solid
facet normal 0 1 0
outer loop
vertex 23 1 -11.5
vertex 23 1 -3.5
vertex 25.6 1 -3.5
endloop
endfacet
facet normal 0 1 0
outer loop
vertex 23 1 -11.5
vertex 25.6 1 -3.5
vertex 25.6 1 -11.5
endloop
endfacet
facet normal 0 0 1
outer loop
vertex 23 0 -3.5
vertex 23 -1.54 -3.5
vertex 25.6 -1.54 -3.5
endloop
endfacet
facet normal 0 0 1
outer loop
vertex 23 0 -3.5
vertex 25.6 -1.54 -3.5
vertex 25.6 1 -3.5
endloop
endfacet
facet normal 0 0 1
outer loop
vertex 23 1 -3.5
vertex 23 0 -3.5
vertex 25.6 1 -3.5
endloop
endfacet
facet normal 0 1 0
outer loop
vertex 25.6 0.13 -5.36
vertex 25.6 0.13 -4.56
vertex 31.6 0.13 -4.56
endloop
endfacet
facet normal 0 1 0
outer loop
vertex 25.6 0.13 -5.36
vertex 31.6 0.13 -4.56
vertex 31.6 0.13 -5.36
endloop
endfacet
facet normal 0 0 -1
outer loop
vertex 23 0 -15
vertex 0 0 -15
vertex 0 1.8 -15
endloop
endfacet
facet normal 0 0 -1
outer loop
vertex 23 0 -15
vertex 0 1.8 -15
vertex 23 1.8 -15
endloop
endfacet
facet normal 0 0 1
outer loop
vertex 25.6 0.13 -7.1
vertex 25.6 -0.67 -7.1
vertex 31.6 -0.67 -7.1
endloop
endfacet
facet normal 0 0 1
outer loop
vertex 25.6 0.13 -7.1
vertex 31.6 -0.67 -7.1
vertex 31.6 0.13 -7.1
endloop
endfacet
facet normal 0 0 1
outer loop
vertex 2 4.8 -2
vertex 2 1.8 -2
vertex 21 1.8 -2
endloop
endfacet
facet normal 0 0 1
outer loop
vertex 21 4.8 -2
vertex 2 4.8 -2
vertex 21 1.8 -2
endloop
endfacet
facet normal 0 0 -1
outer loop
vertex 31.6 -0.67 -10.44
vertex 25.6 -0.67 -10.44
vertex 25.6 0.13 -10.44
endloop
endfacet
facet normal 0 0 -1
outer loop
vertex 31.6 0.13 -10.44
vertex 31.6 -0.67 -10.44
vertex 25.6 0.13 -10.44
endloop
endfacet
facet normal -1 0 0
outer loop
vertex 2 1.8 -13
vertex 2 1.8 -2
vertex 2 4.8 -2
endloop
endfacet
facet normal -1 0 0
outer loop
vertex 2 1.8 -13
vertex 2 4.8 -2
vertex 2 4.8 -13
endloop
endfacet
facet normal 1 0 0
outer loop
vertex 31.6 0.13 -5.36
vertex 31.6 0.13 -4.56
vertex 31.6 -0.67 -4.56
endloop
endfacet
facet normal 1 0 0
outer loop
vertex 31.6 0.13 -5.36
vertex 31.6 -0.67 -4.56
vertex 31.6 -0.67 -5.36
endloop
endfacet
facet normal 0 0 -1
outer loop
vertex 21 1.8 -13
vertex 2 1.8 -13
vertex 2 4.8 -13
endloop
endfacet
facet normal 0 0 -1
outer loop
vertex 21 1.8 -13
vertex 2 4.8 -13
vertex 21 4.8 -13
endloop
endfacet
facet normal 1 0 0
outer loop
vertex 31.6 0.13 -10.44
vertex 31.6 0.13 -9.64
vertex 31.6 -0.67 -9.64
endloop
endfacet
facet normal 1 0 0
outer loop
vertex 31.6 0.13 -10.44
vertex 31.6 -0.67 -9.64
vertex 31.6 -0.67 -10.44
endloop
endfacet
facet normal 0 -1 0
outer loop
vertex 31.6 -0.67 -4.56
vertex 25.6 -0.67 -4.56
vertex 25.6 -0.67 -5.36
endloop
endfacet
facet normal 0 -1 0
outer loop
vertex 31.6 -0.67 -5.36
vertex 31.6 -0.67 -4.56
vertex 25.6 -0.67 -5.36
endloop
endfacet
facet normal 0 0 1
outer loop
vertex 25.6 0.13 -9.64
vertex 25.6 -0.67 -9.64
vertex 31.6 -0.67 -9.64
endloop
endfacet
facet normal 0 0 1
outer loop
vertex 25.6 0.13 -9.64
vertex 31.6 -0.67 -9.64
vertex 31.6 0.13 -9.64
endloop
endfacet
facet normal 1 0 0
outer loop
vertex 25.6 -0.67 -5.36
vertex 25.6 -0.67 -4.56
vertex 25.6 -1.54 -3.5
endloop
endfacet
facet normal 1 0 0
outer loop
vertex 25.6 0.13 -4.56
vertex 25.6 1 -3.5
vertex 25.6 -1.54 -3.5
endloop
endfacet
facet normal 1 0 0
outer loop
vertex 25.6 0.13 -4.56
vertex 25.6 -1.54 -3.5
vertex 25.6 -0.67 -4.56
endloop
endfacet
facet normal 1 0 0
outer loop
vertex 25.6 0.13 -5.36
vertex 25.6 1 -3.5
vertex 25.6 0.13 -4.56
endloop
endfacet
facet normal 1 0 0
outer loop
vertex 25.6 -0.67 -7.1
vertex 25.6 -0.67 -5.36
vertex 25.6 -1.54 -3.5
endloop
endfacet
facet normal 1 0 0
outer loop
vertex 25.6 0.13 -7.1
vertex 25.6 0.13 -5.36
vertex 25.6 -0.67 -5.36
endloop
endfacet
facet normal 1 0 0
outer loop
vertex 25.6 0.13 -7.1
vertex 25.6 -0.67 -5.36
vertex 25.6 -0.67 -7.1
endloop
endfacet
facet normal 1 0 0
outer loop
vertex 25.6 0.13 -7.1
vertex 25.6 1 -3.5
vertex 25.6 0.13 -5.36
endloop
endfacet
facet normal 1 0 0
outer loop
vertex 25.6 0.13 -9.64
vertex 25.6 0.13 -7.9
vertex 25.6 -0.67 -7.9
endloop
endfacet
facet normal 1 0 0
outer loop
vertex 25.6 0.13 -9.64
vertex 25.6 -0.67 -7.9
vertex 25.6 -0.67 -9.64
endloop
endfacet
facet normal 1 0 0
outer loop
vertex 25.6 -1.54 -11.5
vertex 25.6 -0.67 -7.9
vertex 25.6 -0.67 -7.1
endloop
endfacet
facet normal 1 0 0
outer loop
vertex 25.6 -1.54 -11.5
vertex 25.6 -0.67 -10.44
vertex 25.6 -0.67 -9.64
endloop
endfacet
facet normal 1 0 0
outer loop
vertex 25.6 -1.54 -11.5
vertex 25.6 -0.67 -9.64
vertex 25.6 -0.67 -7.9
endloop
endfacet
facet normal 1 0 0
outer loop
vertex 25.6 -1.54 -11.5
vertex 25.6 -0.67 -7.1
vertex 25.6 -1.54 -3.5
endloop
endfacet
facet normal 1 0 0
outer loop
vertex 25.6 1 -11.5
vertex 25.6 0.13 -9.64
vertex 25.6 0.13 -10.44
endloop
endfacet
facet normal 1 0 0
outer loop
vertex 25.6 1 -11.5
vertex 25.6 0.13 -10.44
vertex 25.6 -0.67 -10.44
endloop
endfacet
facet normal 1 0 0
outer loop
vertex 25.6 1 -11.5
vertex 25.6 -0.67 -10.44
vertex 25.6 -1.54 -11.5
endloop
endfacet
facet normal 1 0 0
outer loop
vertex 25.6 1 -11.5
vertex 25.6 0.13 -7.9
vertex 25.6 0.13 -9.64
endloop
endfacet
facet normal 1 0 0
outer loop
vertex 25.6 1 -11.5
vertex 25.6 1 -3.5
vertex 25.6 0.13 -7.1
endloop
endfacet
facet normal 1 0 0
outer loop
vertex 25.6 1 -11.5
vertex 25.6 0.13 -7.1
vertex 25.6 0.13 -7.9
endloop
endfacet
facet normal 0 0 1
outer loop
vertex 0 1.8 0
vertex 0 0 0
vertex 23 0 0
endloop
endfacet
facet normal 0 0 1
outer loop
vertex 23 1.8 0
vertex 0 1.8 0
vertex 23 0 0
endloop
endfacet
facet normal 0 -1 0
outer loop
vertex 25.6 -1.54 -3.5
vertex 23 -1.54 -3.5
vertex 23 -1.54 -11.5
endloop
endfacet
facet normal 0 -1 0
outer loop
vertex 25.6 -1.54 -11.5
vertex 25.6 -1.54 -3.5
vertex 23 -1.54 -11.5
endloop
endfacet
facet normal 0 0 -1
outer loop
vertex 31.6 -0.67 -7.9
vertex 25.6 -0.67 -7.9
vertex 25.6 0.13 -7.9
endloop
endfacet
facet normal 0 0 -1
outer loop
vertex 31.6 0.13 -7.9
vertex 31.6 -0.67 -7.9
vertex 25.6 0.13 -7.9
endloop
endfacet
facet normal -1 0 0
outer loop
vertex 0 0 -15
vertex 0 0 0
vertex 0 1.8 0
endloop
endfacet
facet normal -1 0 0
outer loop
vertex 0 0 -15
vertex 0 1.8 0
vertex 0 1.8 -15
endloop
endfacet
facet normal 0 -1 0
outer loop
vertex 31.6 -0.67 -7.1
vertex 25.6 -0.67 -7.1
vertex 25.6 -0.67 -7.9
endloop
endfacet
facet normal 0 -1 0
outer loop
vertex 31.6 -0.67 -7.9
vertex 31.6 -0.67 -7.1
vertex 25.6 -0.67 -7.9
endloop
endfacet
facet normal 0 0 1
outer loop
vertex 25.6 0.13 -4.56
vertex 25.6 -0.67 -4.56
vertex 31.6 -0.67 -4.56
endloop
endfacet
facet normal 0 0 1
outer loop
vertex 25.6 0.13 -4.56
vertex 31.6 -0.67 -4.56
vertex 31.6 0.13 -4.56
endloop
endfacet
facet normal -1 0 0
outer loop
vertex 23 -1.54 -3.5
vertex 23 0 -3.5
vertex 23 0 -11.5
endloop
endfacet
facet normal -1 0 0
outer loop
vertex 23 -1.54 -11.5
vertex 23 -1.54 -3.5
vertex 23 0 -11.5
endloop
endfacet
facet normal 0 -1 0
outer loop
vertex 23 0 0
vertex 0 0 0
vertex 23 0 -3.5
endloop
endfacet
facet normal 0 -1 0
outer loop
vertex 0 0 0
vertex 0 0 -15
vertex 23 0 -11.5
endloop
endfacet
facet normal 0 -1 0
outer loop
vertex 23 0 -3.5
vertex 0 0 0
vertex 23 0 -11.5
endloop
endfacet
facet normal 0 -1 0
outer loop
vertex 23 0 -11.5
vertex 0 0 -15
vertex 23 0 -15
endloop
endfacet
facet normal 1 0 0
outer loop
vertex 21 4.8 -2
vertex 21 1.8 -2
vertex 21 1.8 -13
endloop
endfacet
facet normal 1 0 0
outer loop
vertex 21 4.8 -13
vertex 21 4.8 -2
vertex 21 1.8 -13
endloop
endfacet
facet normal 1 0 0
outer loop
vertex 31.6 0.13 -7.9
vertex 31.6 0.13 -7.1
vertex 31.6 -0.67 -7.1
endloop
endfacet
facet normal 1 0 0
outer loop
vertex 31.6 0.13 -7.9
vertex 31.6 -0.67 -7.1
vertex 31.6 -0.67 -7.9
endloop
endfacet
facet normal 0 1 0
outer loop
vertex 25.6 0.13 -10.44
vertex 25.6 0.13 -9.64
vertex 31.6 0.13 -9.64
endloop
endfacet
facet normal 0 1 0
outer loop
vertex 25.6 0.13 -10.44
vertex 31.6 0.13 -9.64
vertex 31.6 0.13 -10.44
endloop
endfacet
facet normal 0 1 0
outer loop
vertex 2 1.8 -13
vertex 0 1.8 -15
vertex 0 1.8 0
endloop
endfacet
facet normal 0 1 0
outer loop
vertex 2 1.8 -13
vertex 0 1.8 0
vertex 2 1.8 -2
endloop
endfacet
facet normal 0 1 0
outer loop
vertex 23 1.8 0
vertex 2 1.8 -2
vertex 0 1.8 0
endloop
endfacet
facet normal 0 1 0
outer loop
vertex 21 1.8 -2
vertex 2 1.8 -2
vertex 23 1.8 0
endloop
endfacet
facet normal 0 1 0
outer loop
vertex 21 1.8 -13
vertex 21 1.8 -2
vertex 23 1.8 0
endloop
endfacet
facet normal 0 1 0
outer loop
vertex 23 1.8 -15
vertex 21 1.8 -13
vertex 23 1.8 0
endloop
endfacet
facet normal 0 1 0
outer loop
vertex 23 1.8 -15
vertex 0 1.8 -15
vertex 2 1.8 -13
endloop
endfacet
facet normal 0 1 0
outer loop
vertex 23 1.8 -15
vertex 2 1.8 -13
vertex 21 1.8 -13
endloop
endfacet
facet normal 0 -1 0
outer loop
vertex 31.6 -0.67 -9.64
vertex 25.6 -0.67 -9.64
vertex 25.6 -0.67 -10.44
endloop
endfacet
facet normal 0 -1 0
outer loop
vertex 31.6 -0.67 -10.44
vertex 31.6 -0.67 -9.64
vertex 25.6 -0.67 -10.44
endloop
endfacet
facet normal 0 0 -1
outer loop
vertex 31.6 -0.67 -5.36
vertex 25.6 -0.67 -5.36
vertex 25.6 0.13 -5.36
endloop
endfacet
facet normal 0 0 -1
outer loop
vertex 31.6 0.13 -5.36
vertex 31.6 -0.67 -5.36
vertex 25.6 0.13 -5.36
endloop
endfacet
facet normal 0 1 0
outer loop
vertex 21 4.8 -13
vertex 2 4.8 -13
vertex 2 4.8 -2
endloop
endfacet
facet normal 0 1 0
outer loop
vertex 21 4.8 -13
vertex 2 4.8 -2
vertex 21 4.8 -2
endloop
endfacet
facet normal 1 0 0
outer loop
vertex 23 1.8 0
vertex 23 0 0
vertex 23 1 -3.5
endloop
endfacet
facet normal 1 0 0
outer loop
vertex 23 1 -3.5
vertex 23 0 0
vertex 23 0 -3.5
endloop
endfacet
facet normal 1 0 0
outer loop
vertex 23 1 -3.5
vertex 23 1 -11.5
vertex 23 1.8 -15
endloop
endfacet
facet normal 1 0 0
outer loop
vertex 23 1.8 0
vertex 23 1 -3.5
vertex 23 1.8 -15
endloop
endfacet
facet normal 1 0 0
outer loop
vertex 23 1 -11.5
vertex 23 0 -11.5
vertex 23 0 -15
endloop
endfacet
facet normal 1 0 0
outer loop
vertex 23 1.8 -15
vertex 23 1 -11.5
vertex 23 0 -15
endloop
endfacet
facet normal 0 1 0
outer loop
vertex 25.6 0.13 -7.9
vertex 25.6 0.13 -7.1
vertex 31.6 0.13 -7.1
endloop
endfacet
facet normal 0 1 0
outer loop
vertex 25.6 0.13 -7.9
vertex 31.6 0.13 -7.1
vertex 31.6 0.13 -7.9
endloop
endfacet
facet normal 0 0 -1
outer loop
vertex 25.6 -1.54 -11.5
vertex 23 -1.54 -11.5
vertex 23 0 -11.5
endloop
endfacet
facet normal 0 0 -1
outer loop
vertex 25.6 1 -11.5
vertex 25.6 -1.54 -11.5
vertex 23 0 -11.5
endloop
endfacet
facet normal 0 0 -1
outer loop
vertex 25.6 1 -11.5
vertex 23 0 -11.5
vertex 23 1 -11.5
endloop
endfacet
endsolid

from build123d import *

# Parameters (mm, degrees)
CROQUIS1_W              = 23
CROQUIS1_H              = 15
SALIENTE_EXTRUIR1_DEPTH = 1.8
CROQUIS2_W              = 19
CROQUIS2_H              = 11
SALIENTE_EXTRUIR2_DEPTH = 3
CROQUIS3_W              = 8
CROQUIS3_H              = 2.54
SALIENTE_EXTRUIR3_DEPTH = 2.6
CROQUIS4_W              = 0.8
CROQUIS4_H              = 0.8
SALIENTE_EXTRUIR4_DEPTH = 6


with BuildPart() as part:
    # Croquis1 → Saliente-Extruir1 (new body)
    with BuildSketch(Plane(origin=(0, 0, 0), x_dir=(1, 0, 0), z_dir=(0, 1, 0))):
        with Locations((11.5, 7.5)):
            Rectangle(CROQUIS1_W, CROQUIS1_H)
    extrude(amount=SALIENTE_EXTRUIR1_DEPTH)

    # Croquis2 → Saliente-Extruir2 (add)
    with BuildSketch(Plane(origin=(0, 1.8, 0), x_dir=(1, 0, 0), z_dir=(0, 1, 0))):
        with Locations((11.5, 7.5)):
            Rectangle(CROQUIS2_W, CROQUIS2_H)
    extrude(amount=SALIENTE_EXTRUIR2_DEPTH)

    # Croquis3 → Saliente-Extruir3 (add)
    with BuildSketch(Plane(origin=(23, 0, 0), x_dir=(0, 0, -1), z_dir=(1, 0, 0))):
        with Locations((7.5, -0.27)):
            Rectangle(CROQUIS3_W, CROQUIS3_H)
    extrude(amount=SALIENTE_EXTRUIR3_DEPTH)

    # Croquis4 → Saliente-Extruir4 (add)
    with BuildSketch(Plane(origin=(25.6, 0, 0), x_dir=(0, 0, -1), z_dir=(1, 0, 0))):
        with Locations((10.04, -0.27)):
            Rectangle(CROQUIS4_W, CROQUIS4_H)
        with Locations((7.5, -0.27)):
            Rectangle(CROQUIS4_W, CROQUIS4_H)
        with Locations((4.96, -0.27)):
            Rectangle(CROQUIS4_W, CROQUIS4_H)
    extrude(amount=SALIENTE_EXTRUIR4_DEPTH)


solid = part.part
